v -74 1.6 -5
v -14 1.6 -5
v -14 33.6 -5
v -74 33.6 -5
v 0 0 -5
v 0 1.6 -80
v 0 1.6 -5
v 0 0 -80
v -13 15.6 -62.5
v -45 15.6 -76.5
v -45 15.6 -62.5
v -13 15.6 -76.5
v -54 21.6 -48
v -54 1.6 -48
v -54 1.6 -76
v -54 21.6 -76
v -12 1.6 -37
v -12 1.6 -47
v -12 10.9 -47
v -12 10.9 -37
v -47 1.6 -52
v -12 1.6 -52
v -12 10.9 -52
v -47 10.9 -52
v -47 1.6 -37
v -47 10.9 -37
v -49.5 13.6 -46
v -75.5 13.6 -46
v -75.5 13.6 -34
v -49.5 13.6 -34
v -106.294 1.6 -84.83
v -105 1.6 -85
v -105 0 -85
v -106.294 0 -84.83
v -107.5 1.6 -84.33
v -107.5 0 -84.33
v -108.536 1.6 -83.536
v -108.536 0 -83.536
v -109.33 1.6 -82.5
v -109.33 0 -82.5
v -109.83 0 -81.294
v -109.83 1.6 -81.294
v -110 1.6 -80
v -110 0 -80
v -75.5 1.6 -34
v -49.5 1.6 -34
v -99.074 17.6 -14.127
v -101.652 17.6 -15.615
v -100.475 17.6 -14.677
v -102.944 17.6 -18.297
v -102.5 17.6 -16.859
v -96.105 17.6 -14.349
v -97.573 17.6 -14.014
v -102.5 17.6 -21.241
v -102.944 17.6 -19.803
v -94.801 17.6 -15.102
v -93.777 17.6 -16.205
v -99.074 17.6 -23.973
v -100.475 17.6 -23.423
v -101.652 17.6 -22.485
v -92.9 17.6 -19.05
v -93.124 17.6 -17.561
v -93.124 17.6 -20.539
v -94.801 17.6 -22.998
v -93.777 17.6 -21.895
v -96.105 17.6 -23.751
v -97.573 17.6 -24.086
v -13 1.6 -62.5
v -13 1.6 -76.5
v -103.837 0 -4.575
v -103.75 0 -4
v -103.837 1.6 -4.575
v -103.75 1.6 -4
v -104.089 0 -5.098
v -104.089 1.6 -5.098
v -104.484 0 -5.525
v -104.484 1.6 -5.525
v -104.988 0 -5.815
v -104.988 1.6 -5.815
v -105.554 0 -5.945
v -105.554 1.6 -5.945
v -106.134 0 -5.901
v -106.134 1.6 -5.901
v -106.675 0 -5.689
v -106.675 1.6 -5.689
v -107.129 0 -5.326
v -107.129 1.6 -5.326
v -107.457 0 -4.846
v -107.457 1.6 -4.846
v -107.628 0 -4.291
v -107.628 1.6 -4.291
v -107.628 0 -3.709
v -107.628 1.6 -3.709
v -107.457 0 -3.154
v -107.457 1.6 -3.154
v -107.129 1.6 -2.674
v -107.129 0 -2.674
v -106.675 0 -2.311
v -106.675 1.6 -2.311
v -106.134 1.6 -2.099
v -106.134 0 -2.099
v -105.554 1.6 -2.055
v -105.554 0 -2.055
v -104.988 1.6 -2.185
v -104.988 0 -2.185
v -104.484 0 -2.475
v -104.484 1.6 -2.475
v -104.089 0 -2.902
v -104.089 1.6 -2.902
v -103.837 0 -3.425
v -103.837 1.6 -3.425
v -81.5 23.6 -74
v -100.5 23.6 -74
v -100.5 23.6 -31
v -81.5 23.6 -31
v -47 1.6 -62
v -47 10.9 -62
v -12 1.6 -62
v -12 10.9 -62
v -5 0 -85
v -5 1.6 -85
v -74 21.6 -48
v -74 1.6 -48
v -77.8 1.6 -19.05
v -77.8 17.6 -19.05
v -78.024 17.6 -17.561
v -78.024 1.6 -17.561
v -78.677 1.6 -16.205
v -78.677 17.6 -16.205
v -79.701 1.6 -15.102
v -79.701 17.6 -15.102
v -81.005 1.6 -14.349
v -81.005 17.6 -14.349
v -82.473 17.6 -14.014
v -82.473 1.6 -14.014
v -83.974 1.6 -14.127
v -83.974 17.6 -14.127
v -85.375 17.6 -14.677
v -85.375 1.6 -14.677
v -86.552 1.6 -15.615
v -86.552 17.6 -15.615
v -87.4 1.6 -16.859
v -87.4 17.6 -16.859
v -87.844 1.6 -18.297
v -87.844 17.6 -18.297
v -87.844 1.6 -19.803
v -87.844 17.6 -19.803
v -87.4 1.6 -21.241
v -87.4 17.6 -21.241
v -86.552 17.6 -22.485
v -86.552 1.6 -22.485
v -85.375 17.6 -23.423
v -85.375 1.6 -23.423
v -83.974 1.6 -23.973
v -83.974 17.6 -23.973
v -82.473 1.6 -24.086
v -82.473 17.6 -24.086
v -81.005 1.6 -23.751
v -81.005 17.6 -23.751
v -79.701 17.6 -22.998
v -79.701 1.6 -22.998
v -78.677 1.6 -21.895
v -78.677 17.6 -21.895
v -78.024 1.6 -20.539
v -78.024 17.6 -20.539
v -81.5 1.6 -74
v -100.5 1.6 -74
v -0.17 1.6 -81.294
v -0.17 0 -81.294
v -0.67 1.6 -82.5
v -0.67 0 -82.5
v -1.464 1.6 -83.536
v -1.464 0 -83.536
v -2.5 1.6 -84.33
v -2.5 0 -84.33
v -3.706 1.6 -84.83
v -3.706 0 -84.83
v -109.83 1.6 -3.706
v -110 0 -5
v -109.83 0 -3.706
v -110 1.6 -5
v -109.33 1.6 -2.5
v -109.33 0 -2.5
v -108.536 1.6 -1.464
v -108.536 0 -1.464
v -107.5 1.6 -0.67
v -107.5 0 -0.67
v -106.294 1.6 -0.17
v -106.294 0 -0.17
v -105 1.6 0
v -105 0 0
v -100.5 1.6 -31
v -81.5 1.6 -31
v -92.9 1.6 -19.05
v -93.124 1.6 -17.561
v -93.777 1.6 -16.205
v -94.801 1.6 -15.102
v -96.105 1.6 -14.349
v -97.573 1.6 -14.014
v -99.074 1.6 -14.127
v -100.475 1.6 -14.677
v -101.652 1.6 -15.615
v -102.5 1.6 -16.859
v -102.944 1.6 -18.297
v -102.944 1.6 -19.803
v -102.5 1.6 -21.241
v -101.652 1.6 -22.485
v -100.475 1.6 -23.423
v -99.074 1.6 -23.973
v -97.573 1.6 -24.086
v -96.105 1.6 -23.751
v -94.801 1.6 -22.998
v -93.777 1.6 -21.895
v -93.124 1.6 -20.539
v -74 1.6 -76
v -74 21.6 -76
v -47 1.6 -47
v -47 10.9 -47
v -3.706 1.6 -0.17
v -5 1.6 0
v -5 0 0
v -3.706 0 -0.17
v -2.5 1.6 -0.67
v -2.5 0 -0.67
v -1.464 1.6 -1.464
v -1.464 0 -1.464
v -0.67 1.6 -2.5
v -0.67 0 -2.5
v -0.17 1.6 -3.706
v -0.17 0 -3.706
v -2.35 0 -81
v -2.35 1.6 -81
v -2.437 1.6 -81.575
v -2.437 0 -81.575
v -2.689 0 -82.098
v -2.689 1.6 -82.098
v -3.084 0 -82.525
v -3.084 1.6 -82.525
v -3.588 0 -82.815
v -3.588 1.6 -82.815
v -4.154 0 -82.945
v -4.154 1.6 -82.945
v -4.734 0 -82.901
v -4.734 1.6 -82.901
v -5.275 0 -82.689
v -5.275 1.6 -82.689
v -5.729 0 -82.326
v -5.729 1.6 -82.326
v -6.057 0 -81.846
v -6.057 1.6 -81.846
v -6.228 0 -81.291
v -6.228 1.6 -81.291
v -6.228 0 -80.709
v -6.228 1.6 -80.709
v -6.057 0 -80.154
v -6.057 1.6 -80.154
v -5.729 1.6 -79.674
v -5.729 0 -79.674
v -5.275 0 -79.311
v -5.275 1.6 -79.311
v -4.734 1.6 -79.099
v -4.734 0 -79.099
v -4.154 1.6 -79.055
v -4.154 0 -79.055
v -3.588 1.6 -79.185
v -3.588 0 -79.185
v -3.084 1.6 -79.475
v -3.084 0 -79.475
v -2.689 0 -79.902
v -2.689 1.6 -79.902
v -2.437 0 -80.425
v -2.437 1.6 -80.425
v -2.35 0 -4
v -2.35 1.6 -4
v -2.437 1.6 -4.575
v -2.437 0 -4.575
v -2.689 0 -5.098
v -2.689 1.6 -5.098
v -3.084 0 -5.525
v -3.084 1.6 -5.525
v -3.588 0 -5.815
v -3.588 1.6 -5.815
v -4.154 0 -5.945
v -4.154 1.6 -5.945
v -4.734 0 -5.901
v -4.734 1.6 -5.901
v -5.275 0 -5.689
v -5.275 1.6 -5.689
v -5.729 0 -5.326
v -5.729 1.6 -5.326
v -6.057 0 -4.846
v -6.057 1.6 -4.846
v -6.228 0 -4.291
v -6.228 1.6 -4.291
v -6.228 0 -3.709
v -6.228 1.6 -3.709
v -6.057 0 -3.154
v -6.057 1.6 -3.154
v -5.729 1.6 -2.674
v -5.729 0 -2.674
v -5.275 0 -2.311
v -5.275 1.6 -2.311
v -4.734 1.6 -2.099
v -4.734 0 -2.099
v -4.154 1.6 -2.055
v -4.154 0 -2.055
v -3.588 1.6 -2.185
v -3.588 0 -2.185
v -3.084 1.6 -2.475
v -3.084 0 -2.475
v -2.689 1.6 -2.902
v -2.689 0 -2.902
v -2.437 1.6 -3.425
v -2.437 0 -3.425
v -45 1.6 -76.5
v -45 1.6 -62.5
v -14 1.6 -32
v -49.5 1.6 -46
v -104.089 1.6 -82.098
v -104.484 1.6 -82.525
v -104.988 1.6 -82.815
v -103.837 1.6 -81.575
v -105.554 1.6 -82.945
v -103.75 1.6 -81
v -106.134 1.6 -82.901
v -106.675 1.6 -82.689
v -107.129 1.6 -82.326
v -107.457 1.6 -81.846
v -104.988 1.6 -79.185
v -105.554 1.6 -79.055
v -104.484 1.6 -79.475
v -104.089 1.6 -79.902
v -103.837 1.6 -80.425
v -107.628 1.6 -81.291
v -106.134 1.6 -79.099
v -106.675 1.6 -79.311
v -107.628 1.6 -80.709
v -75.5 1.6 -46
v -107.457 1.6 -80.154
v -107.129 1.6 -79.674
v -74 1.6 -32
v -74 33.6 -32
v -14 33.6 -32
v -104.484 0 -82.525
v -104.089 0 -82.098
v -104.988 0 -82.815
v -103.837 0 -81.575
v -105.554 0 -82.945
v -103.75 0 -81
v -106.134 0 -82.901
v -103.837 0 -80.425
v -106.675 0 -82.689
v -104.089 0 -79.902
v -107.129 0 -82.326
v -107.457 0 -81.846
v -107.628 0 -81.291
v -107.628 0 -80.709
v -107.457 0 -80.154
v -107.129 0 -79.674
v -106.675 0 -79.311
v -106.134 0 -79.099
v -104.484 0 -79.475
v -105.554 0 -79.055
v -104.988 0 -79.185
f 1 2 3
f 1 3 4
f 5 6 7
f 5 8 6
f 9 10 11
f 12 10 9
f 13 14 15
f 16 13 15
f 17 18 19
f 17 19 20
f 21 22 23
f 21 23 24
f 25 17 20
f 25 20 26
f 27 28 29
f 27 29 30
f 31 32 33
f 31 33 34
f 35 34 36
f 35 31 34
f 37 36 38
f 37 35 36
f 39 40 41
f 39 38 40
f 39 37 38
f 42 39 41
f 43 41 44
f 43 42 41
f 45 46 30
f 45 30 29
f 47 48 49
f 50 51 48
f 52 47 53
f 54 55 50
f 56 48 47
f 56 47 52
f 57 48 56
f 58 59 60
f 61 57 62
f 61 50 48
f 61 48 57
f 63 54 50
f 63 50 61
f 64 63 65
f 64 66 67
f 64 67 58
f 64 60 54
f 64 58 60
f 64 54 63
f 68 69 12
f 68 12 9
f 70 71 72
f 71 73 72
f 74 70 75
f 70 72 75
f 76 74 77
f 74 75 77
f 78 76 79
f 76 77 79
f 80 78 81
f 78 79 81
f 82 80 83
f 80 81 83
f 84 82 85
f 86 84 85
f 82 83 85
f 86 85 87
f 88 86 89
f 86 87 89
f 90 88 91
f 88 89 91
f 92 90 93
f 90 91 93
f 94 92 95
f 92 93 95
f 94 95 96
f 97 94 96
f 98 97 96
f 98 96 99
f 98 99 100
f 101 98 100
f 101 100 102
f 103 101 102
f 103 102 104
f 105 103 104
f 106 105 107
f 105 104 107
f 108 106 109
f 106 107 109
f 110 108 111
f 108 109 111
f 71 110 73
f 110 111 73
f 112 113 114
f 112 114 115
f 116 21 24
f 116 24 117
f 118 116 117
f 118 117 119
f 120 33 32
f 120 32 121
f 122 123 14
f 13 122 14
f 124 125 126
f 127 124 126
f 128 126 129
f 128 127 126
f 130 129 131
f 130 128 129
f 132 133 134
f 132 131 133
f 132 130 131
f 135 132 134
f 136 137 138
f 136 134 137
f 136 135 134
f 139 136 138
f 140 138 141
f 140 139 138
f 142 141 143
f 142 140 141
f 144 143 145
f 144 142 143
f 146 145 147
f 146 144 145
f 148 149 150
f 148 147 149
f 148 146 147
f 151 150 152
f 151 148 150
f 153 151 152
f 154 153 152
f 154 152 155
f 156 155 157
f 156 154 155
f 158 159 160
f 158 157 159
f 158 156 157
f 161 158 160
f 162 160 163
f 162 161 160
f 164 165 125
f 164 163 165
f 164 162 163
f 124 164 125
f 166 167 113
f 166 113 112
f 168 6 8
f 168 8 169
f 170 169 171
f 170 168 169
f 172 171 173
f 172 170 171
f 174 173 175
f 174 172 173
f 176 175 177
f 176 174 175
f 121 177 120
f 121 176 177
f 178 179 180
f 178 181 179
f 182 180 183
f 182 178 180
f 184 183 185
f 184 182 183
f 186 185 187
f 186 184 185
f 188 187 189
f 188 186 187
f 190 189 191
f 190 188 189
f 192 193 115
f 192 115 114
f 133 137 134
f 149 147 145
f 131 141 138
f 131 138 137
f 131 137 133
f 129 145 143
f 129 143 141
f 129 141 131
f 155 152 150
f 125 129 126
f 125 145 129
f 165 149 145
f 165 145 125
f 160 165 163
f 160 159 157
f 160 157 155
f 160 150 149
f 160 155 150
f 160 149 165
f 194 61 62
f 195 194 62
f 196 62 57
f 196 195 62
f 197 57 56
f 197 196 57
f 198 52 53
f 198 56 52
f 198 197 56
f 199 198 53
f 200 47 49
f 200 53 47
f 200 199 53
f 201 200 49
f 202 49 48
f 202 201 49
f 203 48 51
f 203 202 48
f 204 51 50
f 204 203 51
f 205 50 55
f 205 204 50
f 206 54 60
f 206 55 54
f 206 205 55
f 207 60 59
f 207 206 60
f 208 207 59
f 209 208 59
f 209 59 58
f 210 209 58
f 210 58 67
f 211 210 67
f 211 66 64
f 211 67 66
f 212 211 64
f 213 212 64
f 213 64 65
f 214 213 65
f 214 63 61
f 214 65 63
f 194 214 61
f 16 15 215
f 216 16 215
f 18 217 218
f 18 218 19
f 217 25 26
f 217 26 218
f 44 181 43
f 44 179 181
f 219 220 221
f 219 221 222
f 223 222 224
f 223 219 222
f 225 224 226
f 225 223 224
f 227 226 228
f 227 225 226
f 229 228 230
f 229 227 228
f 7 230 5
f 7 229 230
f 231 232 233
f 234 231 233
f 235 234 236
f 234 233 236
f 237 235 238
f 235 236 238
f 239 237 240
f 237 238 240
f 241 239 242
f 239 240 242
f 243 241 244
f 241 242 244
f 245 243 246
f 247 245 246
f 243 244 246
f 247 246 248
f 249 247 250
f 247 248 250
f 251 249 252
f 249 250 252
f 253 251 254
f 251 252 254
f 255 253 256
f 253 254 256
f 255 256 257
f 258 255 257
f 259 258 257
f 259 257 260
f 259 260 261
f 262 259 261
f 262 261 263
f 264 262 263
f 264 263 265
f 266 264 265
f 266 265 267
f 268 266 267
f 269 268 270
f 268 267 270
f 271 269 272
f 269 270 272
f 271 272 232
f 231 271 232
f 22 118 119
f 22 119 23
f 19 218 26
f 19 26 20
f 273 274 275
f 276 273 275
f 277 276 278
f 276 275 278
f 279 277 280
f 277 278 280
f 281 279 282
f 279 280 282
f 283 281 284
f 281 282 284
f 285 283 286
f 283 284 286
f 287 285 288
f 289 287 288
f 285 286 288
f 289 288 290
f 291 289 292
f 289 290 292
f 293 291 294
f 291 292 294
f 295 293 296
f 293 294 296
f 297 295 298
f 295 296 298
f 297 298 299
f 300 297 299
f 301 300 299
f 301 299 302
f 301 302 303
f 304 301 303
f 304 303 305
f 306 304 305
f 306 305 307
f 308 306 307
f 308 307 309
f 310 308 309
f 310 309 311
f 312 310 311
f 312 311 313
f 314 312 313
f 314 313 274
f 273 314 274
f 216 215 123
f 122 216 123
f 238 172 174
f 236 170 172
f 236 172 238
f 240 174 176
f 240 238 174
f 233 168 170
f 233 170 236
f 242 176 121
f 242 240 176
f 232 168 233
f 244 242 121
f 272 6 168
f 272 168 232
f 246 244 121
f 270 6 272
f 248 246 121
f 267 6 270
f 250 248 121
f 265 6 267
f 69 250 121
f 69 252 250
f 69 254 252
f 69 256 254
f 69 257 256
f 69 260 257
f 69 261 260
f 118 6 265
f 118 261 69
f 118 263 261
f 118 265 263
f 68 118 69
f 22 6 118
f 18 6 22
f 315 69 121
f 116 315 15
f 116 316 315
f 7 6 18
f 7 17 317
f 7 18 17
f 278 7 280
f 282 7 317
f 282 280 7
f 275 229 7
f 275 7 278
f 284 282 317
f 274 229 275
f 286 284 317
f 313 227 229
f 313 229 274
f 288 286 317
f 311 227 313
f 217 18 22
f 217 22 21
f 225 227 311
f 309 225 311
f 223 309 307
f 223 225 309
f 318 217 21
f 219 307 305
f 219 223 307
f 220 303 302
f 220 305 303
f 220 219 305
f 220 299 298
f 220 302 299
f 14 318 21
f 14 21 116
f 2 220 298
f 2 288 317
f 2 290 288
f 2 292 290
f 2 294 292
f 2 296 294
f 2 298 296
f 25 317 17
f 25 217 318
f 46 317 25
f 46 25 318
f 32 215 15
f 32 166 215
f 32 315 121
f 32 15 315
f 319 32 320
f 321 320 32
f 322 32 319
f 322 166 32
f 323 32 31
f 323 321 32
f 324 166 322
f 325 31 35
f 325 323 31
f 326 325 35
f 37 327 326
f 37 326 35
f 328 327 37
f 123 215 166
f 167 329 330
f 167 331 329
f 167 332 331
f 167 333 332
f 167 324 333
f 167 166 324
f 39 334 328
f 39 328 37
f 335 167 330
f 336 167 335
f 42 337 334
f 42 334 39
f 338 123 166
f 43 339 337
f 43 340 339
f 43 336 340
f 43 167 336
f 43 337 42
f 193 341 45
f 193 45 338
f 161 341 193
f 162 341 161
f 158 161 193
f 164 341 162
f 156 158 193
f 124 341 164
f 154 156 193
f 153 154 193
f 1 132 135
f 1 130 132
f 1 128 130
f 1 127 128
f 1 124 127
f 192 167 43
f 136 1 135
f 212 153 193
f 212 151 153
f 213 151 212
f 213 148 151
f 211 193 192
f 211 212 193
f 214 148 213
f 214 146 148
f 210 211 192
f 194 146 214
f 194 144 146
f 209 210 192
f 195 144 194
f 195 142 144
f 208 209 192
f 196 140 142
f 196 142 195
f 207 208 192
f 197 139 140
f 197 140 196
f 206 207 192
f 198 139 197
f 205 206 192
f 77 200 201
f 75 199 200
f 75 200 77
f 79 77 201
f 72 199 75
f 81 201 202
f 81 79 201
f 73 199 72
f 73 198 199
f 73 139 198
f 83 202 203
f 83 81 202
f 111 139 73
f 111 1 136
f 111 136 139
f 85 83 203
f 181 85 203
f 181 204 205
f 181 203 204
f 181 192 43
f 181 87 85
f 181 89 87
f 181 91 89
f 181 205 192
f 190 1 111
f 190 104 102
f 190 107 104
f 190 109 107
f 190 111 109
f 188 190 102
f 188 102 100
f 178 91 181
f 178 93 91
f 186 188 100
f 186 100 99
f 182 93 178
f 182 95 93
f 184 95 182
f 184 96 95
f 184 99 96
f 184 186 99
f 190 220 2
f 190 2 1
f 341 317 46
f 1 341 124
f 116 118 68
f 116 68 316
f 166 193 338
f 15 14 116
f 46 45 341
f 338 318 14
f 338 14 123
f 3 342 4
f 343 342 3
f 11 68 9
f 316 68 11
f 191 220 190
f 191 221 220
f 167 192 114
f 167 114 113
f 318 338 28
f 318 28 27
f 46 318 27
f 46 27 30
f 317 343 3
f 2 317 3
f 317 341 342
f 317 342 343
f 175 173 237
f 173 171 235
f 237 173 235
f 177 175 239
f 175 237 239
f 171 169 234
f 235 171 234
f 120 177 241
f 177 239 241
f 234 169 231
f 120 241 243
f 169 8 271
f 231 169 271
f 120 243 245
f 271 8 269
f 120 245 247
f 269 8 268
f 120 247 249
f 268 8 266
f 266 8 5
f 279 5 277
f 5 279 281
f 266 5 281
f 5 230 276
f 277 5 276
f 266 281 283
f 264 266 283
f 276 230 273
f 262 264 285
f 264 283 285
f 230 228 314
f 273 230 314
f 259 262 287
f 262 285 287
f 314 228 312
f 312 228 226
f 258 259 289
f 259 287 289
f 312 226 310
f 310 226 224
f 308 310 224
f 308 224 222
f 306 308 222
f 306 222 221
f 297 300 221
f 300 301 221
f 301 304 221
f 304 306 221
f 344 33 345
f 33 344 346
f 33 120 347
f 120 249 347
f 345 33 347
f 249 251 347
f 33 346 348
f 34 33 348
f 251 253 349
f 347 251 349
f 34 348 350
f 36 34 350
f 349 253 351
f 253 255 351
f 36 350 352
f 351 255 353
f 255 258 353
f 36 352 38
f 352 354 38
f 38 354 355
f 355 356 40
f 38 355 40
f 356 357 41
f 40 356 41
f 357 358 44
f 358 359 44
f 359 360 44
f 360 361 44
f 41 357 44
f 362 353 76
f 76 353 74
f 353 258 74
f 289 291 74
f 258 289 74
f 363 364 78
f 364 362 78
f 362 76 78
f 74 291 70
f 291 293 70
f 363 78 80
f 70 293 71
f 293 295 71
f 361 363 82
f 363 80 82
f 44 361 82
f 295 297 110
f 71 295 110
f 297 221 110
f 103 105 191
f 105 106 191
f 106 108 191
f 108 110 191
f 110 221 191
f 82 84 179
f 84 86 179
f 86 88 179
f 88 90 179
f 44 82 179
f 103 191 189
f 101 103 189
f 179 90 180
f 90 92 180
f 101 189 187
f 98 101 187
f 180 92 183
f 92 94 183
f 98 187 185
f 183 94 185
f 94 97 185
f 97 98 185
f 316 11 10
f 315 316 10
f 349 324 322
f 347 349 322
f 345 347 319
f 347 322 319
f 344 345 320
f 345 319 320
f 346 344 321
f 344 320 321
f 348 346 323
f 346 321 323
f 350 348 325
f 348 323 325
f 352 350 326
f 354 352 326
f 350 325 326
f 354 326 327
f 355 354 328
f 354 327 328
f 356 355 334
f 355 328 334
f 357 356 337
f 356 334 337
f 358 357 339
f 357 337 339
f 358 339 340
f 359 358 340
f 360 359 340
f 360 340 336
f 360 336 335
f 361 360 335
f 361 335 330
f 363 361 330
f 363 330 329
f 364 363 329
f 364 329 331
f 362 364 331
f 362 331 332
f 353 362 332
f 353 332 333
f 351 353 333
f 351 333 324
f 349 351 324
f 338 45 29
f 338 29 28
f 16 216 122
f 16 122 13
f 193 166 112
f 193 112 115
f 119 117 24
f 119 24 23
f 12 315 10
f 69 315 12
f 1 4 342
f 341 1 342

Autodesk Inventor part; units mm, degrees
ref_plane "YZ Plane" through (0, 0, 0) normal (1, 0, 0) x (0, 1, 0)
ref_plane "XZ Plane" through (0, 0, 0) normal (0, 1, 0) x (-1, 0, 0)
ref_plane "XY Plane" through (0, 0, 0) normal (0, 0, 1) x (1, 0, 0)
sketch "Sketch1" plane through (0, 0, 0) normal (0, 1, 0) x (-1, 0, 0)
  line L0 (0, 0) -> (110, 0)
  line L1 (110, 0) -> (110, -85)
  line L2 (110, -85) -> (0, -85)
  line L3 (0, -85) -> (0, 0)
  dimension "d0" = 85
  dimension "d1" = 110
extrude "Extrusion1" add sketch "Sketch1" along normal blind 1.6
fillet "Fillet1" radius 5 4 edges at (0, 0.8, -85) (0, 0.8, 0) (-110, 0.8, 0) (-110, 0.8, -85)
sketch "Sketch2" plane through (0, 1.6, 0) normal (0, 1, 0) x (1, 0, 0)
  circle A0 centre (-4.3, 4) radius 1.95
  circle A1 centre (-4.3, 81) radius 1.95
  circle A2 centre (-105.7, 81) radius 1.95
  circle A3 centre (-105.7, 4) radius 1.95
  line L0 (-110, 80) -> (-110, 5) projected
  line L1 (-5, 85) -> (-105, 85) projected
  line L2 (-105, 0) -> (-5, 0) projected
  line L3 (0, 5) -> (0, 80) projected
  point P0 (0, 0)
  dimension "d5" = 3.9
  dimension "d6" = 3.9
  dimension "d7" = 3.9
  dimension "d8" = 3.9
  dimension "d9" = 4.3
  dimension "d10" = 4
  dimension "d11" = 4.3
  dimension "d12" = 4
  dimension "d13" = 4.3
  dimension "d14" = 4
  dimension "d15" = 4.3
  dimension "d16" = 4
extrude "Extrusion2" cut sketch "Sketch2" against normal through all
sketch "Sketch3" plane through (0, 1.6, 0) normal (0, 1, 0) x (1, 0, 0)
  circle A0 centre (-82.85, 19.05) radius 5.05
  circle A1 centre (-97.95, 19.05) radius 5.05
  line L0 (-105, 0) -> (-5, 0) projected
  line L1 (-110, 80) -> (-110, 5) projected
  point P0 (0, 0)
  dimension "d19" = 10.1
  dimension "d20" = 10.1
  dimension "d21" = 19.05
  dimension "d22" = 19.05
  dimension "d23" = 12.05
  dimension "d24" = 15.1
extrude "Extrusion3" add sketch "Sketch3" along normal blind 16
sketch "Sketch4" plane through (0, 1.6, 0) normal (0, 1, 0) x (1, 0, 0)
  line L0 (-14, 5) -> (-74, 5)
  line L1 (-74, 5) -> (-74, 32)
  line L2 (-74, 32) -> (-14, 32)
  line L3 (-14, 32) -> (-14, 5)
  line L4 (-105, 0) -> (-5, 0) projected
  line L5 (0, 5) -> (0, 80) projected
  point P0 (0, 0)
  dimension "d27" = 60
  dimension "d28" = 27
  dimension "d29" = 5
  dimension "d30" = 14
extrude "Extrusion4" add sketch "Sketch4" along normal blind 32
sketch "Sketch5" plane through (0, 1.6, 0) normal (0, 1, 0) x (1, 0, 0)
  line L0 (-81.5, 31) -> (-100.5, 31)
  line L1 (-100.5, 31) -> (-100.5, 74)
  line L2 (-100.5, 74) -> (-81.5, 74)
  line L3 (-81.5, 74) -> (-81.5, 31)
  line L4 (-110, 80) -> (-110, 5) projected
  line L5 (-5, 85) -> (-105, 85) projected
  point P0 (0, 0)
  dimension "d33" = 9.5
  dimension "d34" = 19
  dimension "d35" = 43
  dimension "d36" = 11
extrude "Extrusion5" add sketch "Sketch5" along normal blind 22
sketch "Sketch6" plane through (0, 1.6, 0) normal (0, 1, 0) x (1, 0, 0)
  line L0 (-49.5, 34) -> (-75.5, 34)
  line L1 (-75.5, 34) -> (-75.5, 46)
  line L2 (-75.5, 46) -> (-49.5, 46)
  line L3 (-49.5, 46) -> (-49.5, 34)
  line L4 (-74, 48) -> (-54, 48)
  line L5 (-54, 48) -> (-54, 76)
  line L6 (-54, 76) -> (-74, 76)
  line L7 (-74, 76) -> (-74, 48)
  line L8 (-13, 62.5) -> (-45, 62.5)
  line L9 (-45, 62.5) -> (-45, 76.5)
  line L10 (-45, 76.5) -> (-13, 76.5)
  line L11 (-13, 76.5) -> (-13, 62.5)
  line L12 (-12, 52) -> (-47, 52)
  line L13 (-47, 52) -> (-47, 62)
  line L14 (-47, 62) -> (-12, 62)
  line L15 (-12, 62) -> (-12, 52)
  line L16 (-12, 37) -> (-47, 37)
  line L17 (-47, 37) -> (-47, 47)
  line L18 (-47, 47) -> (-12, 47)
  line L19 (-12, 47) -> (-12, 37)
  line L20 (-5, 85) -> (-105, 85) projected
  line L21 (-81.5, 31) -> (-81.5, 74) projected
  line L22 (-14, 32) -> (-74, 32) projected
  line L23 (0, 5) -> (0, 80) projected
  point P0 (0, 0)
  dimension "d39" = 20
  dimension "d40" = 28
  dimension "d41" = 9
  dimension "d42" = 2
  dimension "d43" = 12
  dimension "d44" = 26
  dimension "d45" = 6
  dimension "d46" = 7.5
  dimension "d47" = 35
  dimension "d48" = 35
  dimension "d49" = 10
  dimension "d50" = 10
  dimension "d51" = 5
  dimension "d52" = 12
  dimension "d53" = 12
  dimension "d54" = 5
  dimension "d55" = 32
  dimension "d56" = 14
  dimension "d57" = 8.5
  dimension "d58" = 13
extrude "Extrusion6" add sketch "Sketch6" along normal blind 20 contours L7 L6 L5 L4
extrude "Extrusion7" add sketch "Sketch6" along normal blind 12 contours L0 L1 L2 L3
extrude "Extrusion8" add sketch "Sketch6" along normal blind 9.3 contours L12 L13 L14 L15 | L16 L17 L18 L19
extrude "Extrusion9" add sketch "Sketch6" along normal blind 14 contours L8 L9 L10 L11
equation "\"d6\" = d5"
equation "\"d7\" = d5"
equation "\"d8\" = d7"
equation "\"d11\" = d9"
equation "\"d12\" = d10"
equation "\"d13\" = d9"
equation "\"d14\" = d12"
equation "\"d15\" = d13"
equation "\"d16\" = d14"
equation "\"d19\" = d20"
equation "\"d22\" = d21"
equation "\"d48\" = d47"
equation "\"d50\" = d49"
equation "\"d53\" = d52"
properties part number "3waysplitter"
